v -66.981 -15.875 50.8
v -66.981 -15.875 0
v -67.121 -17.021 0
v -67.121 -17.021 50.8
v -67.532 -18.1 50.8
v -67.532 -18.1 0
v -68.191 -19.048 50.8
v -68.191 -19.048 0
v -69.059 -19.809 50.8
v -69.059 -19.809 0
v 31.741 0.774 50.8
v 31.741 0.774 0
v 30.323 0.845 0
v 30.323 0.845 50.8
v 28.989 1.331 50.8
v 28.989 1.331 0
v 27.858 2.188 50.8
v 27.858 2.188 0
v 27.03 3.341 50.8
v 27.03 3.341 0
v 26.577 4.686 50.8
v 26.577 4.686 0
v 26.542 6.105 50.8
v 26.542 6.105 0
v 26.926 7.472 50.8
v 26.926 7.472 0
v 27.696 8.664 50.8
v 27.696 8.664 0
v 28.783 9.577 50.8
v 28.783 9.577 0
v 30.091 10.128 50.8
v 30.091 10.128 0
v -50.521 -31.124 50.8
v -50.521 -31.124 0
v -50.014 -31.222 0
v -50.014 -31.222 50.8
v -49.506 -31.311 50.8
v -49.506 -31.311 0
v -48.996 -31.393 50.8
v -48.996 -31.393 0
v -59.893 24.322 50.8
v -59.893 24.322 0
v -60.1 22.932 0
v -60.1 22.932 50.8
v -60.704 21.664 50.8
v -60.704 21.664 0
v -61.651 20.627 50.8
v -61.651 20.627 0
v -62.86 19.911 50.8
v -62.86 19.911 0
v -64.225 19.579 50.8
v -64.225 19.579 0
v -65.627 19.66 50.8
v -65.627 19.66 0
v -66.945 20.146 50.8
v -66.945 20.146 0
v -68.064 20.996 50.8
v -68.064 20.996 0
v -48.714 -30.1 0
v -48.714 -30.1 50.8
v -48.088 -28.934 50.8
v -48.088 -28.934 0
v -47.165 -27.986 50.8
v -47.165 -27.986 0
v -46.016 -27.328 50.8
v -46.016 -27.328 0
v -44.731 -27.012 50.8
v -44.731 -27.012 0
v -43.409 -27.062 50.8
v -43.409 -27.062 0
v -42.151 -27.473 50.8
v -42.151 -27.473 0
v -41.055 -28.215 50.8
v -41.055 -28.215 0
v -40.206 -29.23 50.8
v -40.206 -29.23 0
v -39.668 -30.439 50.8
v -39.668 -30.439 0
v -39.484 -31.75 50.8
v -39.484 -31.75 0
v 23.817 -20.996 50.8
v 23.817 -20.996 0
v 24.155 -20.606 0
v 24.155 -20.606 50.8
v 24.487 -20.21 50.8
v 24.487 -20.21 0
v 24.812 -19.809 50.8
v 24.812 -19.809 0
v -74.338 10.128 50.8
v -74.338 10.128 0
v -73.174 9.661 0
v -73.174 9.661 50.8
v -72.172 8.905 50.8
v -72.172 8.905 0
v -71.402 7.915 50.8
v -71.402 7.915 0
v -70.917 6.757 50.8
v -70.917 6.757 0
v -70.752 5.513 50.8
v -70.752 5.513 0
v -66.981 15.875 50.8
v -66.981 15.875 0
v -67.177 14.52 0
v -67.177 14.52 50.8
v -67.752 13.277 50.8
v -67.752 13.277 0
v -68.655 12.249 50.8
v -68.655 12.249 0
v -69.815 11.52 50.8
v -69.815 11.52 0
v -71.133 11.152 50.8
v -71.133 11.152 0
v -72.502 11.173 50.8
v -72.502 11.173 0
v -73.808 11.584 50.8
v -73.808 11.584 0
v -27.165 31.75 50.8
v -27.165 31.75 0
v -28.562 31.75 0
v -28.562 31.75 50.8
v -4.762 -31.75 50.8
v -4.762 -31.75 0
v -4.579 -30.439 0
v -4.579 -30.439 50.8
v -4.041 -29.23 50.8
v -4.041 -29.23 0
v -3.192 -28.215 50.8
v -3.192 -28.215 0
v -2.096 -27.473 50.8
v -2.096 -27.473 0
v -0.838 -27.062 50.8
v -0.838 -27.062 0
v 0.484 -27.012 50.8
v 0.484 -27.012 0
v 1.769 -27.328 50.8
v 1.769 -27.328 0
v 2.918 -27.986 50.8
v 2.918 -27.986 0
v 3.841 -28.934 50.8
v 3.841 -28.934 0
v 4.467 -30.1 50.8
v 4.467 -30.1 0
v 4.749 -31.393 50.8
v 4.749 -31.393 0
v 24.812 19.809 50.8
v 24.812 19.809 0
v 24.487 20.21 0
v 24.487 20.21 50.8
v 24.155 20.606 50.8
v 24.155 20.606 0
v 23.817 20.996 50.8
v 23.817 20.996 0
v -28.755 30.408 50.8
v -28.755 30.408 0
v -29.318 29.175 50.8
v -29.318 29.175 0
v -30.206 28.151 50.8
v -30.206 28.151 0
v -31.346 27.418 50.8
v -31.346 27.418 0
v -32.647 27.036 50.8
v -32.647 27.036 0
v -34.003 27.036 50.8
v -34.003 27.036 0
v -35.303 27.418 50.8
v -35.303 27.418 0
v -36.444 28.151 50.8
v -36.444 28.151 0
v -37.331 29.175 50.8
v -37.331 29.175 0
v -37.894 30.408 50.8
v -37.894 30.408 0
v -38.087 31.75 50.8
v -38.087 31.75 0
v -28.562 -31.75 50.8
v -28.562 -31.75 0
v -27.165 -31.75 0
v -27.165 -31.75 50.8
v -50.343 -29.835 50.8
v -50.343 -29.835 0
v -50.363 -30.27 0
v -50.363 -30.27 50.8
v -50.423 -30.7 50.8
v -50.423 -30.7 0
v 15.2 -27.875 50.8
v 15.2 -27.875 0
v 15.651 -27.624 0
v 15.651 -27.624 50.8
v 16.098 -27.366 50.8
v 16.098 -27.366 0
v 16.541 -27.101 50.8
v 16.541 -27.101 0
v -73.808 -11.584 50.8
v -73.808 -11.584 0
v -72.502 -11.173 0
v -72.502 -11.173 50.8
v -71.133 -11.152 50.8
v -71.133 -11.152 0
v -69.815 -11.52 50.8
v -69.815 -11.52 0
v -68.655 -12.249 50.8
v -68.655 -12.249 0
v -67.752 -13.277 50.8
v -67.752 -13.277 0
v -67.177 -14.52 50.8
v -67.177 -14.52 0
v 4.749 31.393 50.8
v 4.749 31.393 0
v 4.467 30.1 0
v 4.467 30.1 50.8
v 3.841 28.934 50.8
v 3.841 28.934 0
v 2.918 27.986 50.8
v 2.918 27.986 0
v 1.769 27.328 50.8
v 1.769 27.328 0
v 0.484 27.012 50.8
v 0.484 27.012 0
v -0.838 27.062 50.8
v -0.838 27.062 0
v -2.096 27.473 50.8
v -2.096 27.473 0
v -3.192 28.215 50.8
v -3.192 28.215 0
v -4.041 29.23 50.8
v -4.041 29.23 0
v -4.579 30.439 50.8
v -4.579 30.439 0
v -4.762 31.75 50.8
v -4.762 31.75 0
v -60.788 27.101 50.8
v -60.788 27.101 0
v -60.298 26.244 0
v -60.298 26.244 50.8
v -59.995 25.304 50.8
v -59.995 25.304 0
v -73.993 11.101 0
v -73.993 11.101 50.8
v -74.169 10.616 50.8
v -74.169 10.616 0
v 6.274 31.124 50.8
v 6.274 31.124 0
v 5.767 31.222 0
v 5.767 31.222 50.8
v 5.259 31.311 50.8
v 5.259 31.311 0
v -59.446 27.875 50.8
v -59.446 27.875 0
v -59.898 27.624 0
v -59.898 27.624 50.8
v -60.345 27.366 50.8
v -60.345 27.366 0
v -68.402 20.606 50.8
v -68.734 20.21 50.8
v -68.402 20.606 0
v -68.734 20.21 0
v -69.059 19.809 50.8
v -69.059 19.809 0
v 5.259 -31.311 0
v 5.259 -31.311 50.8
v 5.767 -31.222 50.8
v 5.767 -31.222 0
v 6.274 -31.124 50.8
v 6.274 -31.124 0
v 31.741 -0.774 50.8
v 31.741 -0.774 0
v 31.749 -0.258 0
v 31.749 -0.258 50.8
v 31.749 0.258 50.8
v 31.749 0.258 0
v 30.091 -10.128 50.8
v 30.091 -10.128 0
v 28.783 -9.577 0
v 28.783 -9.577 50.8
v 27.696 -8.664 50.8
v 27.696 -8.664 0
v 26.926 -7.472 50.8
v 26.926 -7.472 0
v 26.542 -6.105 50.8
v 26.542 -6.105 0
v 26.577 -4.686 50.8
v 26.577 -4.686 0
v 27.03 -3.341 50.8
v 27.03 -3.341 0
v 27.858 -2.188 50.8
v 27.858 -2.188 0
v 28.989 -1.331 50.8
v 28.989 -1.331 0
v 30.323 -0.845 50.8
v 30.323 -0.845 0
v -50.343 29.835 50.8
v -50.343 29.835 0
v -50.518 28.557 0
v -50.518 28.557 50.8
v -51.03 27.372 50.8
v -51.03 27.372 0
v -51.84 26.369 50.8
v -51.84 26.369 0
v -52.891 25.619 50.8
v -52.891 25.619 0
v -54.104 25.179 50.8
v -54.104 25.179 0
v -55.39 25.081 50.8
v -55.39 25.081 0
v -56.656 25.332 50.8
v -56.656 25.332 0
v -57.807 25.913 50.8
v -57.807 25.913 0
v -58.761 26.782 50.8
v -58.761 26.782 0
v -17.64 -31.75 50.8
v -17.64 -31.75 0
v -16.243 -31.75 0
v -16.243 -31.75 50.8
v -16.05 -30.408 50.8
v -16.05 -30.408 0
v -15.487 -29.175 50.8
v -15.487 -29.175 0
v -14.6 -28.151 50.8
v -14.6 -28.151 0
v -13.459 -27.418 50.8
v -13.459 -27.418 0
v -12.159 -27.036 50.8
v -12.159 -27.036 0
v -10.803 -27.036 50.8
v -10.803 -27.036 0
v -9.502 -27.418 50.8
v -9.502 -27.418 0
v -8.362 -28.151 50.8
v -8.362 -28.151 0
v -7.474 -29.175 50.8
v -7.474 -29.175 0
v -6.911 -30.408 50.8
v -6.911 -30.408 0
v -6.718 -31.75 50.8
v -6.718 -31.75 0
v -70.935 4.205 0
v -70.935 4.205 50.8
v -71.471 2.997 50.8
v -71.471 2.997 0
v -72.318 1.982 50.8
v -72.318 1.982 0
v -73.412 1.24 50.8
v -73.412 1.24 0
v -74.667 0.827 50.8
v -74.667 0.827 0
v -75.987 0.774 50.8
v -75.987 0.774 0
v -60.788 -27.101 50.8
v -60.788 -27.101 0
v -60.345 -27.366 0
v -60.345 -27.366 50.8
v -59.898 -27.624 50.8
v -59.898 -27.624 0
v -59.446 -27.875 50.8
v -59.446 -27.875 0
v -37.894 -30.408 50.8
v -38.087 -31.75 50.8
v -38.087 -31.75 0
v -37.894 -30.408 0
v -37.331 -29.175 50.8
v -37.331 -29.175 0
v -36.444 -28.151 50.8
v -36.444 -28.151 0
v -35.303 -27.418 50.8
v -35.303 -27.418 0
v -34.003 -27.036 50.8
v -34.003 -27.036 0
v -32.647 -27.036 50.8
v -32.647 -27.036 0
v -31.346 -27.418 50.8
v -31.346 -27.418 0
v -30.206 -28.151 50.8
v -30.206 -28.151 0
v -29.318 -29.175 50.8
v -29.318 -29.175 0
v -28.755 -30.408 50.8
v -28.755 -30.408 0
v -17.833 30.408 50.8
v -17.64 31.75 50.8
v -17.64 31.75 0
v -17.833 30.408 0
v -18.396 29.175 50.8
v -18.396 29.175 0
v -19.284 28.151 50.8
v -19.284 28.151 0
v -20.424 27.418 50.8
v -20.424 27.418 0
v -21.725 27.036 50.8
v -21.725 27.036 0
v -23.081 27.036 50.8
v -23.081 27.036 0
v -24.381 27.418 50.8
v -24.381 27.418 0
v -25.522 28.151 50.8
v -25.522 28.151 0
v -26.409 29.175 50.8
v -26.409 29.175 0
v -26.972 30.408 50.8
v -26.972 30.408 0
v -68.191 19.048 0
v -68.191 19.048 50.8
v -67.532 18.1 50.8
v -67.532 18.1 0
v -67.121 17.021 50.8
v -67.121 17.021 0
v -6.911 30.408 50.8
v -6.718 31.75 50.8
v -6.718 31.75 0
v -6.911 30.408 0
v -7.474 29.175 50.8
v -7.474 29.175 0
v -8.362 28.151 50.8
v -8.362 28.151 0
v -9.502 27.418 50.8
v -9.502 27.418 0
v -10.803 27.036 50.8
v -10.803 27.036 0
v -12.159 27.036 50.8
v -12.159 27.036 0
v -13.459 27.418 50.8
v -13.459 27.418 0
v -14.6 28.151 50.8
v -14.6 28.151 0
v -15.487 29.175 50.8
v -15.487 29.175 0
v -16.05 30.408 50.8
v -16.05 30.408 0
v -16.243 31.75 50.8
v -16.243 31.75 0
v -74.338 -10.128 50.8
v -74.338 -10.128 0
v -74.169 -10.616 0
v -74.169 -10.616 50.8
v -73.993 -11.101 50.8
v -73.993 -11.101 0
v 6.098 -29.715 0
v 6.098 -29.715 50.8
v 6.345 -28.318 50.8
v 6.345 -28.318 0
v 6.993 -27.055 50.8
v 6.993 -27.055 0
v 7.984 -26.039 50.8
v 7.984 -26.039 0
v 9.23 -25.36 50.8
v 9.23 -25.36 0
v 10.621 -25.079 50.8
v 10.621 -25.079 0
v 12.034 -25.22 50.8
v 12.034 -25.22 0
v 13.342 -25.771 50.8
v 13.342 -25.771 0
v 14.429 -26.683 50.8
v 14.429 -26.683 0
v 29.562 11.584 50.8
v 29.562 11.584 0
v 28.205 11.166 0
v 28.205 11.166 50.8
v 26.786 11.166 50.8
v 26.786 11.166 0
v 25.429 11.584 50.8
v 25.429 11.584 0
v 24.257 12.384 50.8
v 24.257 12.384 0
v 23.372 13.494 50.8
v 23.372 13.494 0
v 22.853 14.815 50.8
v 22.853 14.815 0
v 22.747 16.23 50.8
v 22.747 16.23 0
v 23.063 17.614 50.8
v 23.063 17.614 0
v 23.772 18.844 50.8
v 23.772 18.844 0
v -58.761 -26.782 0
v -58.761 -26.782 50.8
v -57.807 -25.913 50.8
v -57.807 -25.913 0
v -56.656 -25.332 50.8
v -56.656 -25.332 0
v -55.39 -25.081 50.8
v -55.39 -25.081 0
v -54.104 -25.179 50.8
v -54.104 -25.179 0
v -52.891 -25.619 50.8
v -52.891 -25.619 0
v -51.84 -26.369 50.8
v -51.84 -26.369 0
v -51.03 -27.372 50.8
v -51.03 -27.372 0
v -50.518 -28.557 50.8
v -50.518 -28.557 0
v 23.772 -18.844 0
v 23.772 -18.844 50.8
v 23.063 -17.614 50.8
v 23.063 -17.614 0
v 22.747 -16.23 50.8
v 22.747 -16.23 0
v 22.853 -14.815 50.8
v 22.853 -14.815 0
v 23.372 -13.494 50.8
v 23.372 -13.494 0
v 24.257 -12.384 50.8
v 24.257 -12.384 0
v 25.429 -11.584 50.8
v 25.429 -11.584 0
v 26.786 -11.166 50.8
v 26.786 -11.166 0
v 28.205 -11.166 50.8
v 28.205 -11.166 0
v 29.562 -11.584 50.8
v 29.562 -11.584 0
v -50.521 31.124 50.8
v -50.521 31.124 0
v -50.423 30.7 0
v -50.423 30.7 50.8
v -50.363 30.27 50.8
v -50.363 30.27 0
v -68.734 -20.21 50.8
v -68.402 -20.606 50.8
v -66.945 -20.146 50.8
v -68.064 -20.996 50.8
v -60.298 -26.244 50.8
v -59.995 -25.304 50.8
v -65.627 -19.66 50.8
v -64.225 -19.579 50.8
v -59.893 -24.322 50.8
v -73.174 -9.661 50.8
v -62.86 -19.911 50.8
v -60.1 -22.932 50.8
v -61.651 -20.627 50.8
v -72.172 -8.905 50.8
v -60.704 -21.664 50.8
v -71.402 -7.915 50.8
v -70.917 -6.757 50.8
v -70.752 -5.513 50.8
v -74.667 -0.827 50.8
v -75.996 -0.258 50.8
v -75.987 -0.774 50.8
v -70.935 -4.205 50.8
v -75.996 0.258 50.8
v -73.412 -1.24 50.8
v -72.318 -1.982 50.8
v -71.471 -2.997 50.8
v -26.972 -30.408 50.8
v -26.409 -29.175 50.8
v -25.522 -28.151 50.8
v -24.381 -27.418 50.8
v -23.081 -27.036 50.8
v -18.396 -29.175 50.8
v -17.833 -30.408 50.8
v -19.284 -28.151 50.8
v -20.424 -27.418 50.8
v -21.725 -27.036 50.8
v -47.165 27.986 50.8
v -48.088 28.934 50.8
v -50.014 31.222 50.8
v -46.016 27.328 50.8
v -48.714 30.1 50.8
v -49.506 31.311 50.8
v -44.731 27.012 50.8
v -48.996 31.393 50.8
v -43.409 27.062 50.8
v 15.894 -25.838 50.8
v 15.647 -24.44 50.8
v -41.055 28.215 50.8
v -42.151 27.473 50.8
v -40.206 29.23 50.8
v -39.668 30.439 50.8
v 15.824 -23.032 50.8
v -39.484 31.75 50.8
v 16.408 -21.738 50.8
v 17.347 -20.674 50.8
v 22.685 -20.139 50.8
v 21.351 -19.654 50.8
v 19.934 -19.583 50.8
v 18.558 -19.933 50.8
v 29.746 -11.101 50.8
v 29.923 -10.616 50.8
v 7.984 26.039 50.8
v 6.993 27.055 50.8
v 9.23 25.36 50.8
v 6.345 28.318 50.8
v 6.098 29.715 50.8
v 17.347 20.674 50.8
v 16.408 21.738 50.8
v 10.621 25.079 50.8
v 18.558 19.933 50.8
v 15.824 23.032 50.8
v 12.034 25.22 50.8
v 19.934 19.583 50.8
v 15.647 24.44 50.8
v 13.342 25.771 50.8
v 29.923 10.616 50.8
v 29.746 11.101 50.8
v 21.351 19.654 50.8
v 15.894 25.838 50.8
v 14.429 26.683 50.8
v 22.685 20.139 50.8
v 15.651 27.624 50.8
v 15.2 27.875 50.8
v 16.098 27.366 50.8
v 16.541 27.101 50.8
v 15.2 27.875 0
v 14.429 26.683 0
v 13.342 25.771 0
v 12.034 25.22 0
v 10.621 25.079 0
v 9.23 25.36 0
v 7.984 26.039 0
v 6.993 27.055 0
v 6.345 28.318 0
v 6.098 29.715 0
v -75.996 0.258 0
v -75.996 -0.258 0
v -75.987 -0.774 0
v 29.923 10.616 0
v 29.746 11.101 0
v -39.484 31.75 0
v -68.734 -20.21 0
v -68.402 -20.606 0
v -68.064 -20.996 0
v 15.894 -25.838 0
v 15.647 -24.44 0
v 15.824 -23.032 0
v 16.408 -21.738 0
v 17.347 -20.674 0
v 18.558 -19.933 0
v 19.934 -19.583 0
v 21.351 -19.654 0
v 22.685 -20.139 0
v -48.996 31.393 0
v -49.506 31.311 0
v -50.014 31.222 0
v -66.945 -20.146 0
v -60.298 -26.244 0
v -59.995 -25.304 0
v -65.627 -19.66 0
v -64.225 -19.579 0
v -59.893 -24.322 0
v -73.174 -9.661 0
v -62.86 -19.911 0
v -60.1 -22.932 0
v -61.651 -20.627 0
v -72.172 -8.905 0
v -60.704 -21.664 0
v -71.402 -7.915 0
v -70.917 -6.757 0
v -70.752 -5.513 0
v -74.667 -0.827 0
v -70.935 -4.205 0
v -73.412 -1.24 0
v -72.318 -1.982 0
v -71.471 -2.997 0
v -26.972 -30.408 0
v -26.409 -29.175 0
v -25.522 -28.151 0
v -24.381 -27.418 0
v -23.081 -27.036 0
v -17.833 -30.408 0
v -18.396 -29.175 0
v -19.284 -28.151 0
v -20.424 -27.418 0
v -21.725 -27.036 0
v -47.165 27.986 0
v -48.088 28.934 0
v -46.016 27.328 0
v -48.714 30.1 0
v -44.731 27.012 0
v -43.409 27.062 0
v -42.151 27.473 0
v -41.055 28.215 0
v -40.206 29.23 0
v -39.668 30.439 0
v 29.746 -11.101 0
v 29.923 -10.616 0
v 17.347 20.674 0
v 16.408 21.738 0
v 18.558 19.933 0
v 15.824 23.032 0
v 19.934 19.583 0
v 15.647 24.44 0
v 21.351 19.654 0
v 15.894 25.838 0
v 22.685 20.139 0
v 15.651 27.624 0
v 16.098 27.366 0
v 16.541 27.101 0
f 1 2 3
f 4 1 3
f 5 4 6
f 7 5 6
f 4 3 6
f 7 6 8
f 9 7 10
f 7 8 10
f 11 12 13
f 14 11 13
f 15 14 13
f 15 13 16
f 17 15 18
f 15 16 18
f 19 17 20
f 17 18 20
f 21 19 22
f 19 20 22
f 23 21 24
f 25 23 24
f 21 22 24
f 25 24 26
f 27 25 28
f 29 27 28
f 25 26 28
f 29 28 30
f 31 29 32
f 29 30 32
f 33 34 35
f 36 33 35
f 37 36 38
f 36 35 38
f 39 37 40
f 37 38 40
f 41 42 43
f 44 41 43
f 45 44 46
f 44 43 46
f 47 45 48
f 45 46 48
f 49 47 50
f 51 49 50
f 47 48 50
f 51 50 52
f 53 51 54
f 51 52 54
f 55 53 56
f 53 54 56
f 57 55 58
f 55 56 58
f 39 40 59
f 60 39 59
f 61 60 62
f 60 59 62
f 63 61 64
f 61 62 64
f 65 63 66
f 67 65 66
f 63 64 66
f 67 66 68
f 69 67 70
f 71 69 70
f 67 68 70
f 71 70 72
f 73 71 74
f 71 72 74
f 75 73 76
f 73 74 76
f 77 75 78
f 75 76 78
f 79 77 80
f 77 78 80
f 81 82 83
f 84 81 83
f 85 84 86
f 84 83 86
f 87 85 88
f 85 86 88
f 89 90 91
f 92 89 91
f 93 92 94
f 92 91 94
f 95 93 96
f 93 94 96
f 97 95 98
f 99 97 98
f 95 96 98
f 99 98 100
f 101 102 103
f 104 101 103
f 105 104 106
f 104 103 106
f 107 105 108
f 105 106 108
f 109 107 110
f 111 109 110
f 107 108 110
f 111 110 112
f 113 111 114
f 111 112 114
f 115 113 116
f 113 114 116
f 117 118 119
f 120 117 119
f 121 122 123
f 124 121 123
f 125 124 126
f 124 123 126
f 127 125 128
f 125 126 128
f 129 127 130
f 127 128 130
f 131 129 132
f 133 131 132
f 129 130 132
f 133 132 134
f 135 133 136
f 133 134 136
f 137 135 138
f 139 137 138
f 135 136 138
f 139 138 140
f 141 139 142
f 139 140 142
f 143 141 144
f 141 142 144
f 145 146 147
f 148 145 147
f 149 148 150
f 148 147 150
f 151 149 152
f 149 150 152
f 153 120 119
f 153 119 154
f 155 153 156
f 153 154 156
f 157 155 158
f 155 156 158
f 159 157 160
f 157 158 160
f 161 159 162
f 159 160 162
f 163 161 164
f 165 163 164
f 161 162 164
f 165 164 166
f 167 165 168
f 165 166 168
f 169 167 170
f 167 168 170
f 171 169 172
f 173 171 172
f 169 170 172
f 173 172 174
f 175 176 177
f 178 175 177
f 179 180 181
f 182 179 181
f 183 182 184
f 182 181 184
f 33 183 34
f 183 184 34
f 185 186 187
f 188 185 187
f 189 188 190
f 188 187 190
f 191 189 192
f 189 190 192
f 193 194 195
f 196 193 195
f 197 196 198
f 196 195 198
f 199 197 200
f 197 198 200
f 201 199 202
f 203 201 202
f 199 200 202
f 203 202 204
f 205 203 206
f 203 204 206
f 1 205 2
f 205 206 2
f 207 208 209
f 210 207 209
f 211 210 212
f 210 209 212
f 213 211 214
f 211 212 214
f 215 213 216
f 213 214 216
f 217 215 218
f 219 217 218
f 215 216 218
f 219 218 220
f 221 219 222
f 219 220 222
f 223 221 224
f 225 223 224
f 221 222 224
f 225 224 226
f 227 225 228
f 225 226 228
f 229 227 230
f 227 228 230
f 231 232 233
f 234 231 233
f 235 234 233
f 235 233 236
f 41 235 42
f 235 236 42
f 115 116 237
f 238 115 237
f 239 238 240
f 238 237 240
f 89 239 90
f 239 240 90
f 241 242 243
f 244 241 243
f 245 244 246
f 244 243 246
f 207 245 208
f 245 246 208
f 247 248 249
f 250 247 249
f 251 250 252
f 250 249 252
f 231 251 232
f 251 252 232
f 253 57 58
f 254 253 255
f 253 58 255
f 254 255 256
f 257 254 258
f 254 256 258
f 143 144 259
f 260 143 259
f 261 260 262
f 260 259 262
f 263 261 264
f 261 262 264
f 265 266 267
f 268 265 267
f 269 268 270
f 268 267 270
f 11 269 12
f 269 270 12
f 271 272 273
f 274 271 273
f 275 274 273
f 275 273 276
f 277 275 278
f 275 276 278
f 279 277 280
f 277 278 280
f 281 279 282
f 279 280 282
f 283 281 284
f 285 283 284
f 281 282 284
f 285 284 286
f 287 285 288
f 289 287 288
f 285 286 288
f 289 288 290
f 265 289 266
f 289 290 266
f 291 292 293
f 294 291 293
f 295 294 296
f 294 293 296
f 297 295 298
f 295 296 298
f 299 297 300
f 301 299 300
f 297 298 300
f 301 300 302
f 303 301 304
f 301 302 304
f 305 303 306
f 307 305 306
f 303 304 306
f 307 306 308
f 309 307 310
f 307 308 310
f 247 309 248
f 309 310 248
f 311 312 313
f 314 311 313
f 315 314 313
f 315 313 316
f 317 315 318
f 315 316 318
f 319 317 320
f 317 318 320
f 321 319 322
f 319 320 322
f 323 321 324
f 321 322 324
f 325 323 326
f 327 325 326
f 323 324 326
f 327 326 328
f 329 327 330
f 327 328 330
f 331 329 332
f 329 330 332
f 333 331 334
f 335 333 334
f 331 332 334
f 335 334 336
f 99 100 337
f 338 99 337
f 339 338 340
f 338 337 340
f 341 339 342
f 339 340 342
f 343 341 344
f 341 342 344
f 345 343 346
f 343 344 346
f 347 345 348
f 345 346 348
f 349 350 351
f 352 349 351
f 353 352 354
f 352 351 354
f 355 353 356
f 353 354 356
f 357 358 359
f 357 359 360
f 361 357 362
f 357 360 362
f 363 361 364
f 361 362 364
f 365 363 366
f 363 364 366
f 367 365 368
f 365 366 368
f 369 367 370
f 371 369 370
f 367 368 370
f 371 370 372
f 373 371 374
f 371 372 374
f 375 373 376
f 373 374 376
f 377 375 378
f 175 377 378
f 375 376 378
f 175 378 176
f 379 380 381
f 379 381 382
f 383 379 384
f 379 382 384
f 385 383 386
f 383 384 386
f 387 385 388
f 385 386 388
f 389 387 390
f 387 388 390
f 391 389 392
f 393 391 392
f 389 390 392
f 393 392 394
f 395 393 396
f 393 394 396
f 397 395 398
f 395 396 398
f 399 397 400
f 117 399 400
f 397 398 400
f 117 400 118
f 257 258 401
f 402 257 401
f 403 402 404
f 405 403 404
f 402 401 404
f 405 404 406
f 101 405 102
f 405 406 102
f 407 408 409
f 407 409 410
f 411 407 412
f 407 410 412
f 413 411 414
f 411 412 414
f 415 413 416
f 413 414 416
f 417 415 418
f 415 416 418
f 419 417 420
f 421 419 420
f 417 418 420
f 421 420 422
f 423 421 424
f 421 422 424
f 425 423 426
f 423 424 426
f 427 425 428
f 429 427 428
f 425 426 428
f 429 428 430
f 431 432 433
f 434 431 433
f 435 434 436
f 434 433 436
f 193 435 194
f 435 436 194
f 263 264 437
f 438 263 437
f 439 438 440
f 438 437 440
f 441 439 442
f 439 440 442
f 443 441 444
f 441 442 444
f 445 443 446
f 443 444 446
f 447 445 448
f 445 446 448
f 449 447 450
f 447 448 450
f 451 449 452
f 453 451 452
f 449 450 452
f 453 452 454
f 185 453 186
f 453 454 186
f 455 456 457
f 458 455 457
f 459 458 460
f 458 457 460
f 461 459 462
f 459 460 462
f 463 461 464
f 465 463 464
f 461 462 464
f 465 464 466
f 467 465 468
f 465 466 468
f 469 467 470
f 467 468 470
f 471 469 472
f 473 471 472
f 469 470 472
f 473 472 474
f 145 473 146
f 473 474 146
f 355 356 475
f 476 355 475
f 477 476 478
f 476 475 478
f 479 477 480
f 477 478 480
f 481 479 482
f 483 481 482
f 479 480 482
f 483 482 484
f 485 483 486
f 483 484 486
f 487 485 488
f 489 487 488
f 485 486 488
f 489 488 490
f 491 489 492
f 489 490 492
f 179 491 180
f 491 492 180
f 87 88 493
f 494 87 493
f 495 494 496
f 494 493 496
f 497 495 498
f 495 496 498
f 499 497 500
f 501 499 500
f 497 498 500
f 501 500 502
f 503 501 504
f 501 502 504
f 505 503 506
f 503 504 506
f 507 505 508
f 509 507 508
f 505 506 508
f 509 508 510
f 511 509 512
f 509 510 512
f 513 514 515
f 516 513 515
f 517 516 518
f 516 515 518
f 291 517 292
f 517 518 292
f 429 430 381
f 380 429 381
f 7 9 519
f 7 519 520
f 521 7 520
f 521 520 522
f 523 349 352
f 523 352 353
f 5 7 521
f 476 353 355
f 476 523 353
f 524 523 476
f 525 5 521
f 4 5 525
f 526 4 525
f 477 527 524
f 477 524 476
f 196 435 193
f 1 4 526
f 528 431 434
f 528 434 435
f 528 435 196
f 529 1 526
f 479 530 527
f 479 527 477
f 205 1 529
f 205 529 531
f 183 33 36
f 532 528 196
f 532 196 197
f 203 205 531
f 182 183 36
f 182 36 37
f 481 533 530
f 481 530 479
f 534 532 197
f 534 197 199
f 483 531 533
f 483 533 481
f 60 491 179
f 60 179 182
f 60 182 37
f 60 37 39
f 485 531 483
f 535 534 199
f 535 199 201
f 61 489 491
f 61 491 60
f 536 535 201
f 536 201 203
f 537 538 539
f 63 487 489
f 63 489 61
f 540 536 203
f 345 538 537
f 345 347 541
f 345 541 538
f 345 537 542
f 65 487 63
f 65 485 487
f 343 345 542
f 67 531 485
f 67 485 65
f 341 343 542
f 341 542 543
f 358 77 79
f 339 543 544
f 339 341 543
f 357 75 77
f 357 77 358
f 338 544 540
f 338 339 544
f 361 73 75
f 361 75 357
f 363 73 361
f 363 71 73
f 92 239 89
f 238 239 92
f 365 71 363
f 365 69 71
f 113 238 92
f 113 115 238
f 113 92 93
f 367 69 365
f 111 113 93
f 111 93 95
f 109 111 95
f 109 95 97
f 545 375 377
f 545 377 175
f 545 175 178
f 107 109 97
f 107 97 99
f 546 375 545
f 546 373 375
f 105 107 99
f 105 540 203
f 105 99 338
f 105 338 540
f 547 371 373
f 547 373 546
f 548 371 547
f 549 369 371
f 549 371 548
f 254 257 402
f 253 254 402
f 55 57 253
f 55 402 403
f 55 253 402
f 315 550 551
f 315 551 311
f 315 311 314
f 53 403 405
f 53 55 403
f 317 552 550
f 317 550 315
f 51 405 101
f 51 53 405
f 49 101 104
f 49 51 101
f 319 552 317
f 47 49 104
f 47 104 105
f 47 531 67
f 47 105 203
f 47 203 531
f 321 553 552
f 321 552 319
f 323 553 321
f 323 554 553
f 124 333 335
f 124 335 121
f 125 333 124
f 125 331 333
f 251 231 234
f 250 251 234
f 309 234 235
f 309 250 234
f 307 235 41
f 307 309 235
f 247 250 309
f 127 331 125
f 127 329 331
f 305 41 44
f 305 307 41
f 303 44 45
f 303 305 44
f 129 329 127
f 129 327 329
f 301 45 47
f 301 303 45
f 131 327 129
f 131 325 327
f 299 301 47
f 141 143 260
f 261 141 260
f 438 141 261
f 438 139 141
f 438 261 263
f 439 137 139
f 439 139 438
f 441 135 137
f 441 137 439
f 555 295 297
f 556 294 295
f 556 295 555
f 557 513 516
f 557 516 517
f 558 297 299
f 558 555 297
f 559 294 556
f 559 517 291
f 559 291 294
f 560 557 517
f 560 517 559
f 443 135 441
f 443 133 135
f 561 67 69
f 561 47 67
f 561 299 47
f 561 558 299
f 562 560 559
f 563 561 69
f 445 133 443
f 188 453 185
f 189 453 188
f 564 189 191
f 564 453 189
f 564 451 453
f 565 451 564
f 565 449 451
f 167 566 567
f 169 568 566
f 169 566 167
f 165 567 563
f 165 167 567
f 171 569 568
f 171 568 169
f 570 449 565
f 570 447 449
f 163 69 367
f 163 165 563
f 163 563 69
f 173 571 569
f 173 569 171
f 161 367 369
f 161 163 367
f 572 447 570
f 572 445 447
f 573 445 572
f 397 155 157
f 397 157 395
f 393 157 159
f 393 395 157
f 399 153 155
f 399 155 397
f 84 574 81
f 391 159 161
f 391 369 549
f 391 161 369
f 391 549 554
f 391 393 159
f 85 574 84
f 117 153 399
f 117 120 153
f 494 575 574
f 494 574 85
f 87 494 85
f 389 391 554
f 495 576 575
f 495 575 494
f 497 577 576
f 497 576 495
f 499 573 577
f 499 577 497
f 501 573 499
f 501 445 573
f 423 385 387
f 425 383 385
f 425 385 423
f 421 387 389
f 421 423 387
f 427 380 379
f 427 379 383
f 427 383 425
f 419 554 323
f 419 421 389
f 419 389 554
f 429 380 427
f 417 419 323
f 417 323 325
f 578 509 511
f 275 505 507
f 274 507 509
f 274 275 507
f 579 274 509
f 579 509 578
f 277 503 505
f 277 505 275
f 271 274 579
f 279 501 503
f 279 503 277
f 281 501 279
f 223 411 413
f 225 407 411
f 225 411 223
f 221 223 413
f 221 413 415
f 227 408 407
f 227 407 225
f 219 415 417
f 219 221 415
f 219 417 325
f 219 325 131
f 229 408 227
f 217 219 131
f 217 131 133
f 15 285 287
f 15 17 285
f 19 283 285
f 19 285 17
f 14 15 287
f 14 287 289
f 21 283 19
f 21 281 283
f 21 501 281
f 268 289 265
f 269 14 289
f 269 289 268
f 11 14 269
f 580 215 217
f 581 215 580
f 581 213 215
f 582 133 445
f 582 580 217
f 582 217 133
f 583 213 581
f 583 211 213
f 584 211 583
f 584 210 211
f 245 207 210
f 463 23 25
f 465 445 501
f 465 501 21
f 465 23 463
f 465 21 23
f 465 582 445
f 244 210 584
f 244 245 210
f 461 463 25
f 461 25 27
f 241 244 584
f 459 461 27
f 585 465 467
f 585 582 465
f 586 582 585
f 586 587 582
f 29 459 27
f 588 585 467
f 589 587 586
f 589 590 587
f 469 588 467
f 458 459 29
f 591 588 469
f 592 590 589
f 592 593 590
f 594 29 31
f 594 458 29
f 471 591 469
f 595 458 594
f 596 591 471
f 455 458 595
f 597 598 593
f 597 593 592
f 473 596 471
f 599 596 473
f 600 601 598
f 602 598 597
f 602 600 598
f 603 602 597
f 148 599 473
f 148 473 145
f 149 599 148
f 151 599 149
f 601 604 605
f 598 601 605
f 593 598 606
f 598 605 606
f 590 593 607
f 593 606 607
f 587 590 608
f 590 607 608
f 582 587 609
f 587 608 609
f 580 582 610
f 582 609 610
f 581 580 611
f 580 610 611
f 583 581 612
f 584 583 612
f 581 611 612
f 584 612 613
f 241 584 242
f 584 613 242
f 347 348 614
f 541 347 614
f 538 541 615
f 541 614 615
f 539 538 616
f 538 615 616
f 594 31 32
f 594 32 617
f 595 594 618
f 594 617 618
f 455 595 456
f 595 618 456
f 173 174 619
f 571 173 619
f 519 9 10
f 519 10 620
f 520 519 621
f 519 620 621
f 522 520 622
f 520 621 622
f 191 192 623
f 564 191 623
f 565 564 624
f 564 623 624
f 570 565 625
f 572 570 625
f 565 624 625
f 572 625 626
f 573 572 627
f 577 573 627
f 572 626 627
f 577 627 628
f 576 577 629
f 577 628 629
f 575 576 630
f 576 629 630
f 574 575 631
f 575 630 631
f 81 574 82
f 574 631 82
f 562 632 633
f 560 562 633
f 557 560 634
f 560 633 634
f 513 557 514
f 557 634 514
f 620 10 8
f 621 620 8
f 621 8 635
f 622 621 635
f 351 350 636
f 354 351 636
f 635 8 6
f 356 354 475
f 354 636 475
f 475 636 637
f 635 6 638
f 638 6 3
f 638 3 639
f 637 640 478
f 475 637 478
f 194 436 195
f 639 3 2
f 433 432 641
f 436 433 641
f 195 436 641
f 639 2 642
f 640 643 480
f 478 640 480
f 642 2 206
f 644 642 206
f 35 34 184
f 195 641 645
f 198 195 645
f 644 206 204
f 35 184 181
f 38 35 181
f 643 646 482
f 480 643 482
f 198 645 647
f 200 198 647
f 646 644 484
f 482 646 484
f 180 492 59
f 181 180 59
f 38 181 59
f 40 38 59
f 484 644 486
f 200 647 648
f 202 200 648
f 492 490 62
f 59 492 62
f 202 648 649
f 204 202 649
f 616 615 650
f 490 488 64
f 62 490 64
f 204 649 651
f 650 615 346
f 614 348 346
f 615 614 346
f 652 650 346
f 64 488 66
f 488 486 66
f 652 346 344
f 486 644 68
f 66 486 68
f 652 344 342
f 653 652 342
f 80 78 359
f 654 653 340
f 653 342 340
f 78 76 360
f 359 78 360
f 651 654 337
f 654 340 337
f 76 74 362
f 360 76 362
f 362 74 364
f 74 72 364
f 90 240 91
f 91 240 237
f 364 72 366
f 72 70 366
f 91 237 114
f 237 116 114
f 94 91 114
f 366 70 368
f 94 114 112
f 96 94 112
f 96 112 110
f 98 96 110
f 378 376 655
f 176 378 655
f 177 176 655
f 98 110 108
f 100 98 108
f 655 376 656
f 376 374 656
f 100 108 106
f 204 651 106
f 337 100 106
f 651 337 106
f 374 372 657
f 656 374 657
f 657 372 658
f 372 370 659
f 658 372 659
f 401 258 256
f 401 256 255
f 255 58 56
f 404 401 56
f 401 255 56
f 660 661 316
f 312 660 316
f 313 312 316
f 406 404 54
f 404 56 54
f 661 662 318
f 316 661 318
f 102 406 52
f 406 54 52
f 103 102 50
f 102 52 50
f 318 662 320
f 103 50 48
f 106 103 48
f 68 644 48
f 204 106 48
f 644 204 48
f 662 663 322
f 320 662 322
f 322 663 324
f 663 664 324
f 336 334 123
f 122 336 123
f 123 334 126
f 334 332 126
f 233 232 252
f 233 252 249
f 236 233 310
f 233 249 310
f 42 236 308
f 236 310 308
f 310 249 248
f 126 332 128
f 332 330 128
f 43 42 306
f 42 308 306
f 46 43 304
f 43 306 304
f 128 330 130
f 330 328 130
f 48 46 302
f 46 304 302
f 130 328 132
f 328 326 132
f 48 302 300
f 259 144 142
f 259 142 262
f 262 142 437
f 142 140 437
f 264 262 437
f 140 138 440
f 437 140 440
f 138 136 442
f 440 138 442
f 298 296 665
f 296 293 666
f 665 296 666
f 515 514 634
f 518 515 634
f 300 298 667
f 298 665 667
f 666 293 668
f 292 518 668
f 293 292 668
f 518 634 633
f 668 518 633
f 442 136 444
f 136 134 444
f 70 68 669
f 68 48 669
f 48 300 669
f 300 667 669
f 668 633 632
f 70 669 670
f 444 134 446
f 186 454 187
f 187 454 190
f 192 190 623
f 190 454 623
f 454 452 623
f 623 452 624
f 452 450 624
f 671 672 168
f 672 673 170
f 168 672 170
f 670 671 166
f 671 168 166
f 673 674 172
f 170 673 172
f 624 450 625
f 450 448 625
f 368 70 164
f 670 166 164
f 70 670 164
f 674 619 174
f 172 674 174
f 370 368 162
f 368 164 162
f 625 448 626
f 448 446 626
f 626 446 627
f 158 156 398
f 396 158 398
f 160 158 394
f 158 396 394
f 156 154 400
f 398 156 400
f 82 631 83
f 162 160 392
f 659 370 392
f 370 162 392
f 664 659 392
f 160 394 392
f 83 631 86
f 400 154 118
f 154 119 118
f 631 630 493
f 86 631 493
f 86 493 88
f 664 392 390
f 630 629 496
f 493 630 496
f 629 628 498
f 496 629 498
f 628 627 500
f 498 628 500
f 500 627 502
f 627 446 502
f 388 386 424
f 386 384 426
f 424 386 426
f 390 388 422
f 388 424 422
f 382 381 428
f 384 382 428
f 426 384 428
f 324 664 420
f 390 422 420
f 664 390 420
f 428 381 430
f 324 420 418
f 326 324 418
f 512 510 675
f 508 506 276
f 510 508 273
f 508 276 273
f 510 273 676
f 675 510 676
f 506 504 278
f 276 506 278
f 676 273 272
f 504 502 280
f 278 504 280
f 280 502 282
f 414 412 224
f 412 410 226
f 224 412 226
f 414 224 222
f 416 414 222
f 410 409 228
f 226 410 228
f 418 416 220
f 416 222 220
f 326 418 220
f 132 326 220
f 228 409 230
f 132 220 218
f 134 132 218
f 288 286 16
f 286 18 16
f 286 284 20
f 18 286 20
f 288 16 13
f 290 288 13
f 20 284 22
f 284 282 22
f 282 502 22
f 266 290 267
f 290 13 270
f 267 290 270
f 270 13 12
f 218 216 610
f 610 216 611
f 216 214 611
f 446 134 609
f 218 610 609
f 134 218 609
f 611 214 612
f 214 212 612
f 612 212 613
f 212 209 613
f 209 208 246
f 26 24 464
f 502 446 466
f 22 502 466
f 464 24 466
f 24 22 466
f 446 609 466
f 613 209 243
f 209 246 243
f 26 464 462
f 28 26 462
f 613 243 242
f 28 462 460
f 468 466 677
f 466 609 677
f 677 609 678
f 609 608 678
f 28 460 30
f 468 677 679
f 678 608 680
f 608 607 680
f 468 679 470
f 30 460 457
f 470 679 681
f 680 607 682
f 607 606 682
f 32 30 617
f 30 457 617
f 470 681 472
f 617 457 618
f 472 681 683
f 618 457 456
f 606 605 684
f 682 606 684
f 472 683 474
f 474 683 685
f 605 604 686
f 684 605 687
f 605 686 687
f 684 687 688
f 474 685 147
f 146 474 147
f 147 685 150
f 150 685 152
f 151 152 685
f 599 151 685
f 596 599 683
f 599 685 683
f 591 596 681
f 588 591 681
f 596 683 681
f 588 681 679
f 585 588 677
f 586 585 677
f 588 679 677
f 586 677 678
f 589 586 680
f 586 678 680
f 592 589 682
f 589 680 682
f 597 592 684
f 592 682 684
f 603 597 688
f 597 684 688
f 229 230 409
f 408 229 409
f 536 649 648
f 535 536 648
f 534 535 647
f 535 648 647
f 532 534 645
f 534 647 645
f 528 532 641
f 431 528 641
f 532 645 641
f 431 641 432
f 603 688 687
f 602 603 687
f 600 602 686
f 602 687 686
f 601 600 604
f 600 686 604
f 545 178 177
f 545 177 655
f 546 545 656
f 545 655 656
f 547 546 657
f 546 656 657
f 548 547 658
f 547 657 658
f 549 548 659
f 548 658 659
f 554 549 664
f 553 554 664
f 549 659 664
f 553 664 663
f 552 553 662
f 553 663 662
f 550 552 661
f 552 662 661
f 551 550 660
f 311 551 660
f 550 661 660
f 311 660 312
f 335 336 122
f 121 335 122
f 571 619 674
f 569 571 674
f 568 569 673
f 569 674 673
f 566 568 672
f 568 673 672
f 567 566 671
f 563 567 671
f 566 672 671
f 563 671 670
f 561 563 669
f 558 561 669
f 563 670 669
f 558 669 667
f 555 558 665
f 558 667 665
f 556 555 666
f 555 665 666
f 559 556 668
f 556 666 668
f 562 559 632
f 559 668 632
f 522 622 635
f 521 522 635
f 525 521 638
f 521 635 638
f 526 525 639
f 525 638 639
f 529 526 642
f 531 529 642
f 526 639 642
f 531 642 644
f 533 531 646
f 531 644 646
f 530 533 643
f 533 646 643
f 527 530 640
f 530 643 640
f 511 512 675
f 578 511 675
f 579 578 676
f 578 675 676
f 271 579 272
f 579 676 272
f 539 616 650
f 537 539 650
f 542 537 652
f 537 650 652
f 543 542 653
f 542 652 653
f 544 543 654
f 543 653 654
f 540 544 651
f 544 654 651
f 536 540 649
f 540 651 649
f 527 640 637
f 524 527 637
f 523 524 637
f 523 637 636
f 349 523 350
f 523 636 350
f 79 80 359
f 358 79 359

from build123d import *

# Parameters (mm, degrees)
F1_DEPTH = 50.8


with BuildPart() as f1:
    # F0 (on Top) → F1 (new body)
    with BuildSketch(Plane.XY):
        with BuildLine():
            ThreePointArc((-39.4843, 31.75), (-44.0680803662, 26.9908545365), (-48.9958865795, 31.3928125))
            ThreePointArc((-48.9958865795, 31.3928125), (-49.7601296409, 31.2676461581), (-50.5210926164, 31.1238775246))
            ThreePointArc((-50.5210926164, 31.1238775246), (-50.3880618617, 30.485653166), (-50.3434395506, 29.83524071))
            ThreePointArc((-50.3434395506, 29.83524071), (-54.1035181326, 25.1794316985), (-59.4464558449, 27.8753109794))
            ThreePointArc((-59.4464558449, 27.8753109794), (-60.1218, 27.4963065702), (-60.7876995241, 27.1009435801))
            ThreePointArc((-60.7876995241, 27.1009435801), (-60.1220470195, 25.7816931615), (-59.8928066075, 24.321911069))
            ThreePointArc((-59.8928066075, 24.321911069), (-62.859641473, 19.9109029105), (-68.0637222924, 20.9956355589))
            ThreePointArc((-68.0637222924, 20.9956355589), (-68.568711069, 20.4085066075), (-69.0592298315, 19.8092358726))
            ThreePointArc((-69.0592298315, 19.8092358726), (-67.5322058816, 18.0997969887), (-66.9806065702, 15.875))
            ThreePointArc((-66.9806065702, 15.875), (-69.2087580954, 11.8428189452), (-73.808316411, 11.5835766274))
            ThreePointArc((-73.808316411, 11.5835766274), (-74.08204071, 10.8591395506), (-74.3380149087, 10.1282419657))
            ThreePointArc((-74.3380149087, 10.1282419657), (-71.7538504556, 8.4355421952), (-70.7519461581, 5.5133296409))
            ThreePointArc((-70.7519461581, 5.5133296409), (-72.3184192392, 1.9824914708), (-75.987355369, 0.7743673992))
            ThreePointArc((-75.987355369, 0.7743673992), (-75.9968, 0), (-75.987355369, -0.7743673992))
            ThreePointArc((-75.987355369, -0.7743673992), (-72.3184192392, -1.9824914708), (-70.7519461581, -5.5133296409))
            ThreePointArc((-70.7519461581, -5.5133296409), (-71.7538504556, -8.4355421952), (-74.3380149087, -10.1282419657))
            ThreePointArc((-74.3380149087, -10.1282419657), (-74.08204071, -10.8591395506), (-73.808316411, -11.5835766274))
            ThreePointArc((-73.808316411, -11.5835766274), (-69.2087580954, -11.8428189452), (-66.9806065702, -15.875))
            ThreePointArc((-66.9806065702, -15.875), (-67.5322058816, -18.0997969887), (-69.0592298315, -19.8092358726))
            ThreePointArc((-69.0592298315, -19.8092358726), (-68.568711069, -20.4085066075), (-68.0637222924, -20.9956355589))
            ThreePointArc((-68.0637222924, -20.9956355589), (-62.859641473, -19.9109029105), (-59.8928066075, -24.321911069))
            ThreePointArc((-59.8928066075, -24.321911069), (-60.1220470195, -25.7816931615), (-60.7876995241, -27.1009435801))
            ThreePointArc((-60.7876995241, -27.1009435801), (-60.1218, -27.4963065702), (-59.4464558449, -27.8753109794))
            ThreePointArc((-59.4464558449, -27.8753109794), (-54.1035181326, -25.1794316985), (-50.3434395506, -29.83524071))
            ThreePointArc((-50.3434395506, -29.83524071), (-50.3880618617, -30.485653166), (-50.5210926164, -31.1238775246))
            ThreePointArc((-50.5210926164, -31.1238775246), (-49.7601296409, -31.2676461581), (-48.9958865795, -31.3928125))
            ThreePointArc((-48.9958865795, -31.3928125), (-44.0680803662, -26.9908545365), (-39.4843, -31.75))
            Line((-39.4843, -31.75), (-38.0873, -31.75))
            ThreePointArc((-38.0873, -31.75), (-33.3248, -26.9875), (-28.5623, -31.75))
            Line((-28.5623, -31.75), (-27.1653, -31.75))
            ThreePointArc((-27.1653, -31.75), (-22.4028, -26.9875), (-17.6403, -31.75))
            Line((-17.6403, -31.75), (-16.2433, -31.75))
            ThreePointArc((-16.2433, -31.75), (-11.4808, -26.9875), (-6.7183, -31.75))
            Line((-6.7183, -31.75), (-4.7625, -31.75))
            ThreePointArc((-4.7625, -31.75), (-0.1787196338, -26.9908545365), (4.7490865795, -31.3928125))
            ThreePointArc((4.7490865795, -31.3928125), (5.5133296409, -31.2676461581), (6.2742926164, -31.1238775246))
            ThreePointArc((6.2742926164, -31.1238775246), (9.230268618, -25.3599546035), (15.1996558449, -27.8753109794))
            ThreePointArc((15.1996558449, -27.8753109794), (15.875, -27.4963065702), (16.5408995241, -27.1009435801))
            ThreePointArc((16.5408995241, -27.1009435801), (17.3472306164, -20.6736244087), (23.8169222924, -20.9956355589))
            ThreePointArc((23.8169222924, -20.9956355589), (24.321911069, -20.4085066075), (24.8124298315, -19.8092358726))
            ThreePointArc((24.8124298315, -19.8092358726), (23.3718605846, -13.49375), (29.561516411, -11.5835766274))
            ThreePointArc((29.561516411, -11.5835766274), (29.83524071, -10.8591395506), (30.0912149087, -10.1282419657))
            ThreePointArc((30.0912149087, -10.1282419657), (26.5774992344, -4.6863301948), (31.740555369, -0.7743673992))
            ThreePointArc((31.740555369, -0.7743673992), (31.75, 0), (31.740555369, 0.7743673992))
            ThreePointArc((31.740555369, 0.7743673992), (26.5774992344, 4.6863301948), (30.0912149087, 10.1282419657))
            ThreePointArc((30.0912149087, 10.1282419657), (29.83524071, 10.8591395506), (29.561516411, 11.5835766274))
            ThreePointArc((29.561516411, 11.5835766274), (23.3718605846, 13.49375), (24.8124298315, 19.8092358726))
            ThreePointArc((24.8124298315, 19.8092358726), (24.321911069, 20.4085066075), (23.8169222924, 20.9956355589))
            ThreePointArc((23.8169222924, 20.9956355589), (17.3472306164, 20.6736244087), (16.5408995241, 27.1009435801))
            ThreePointArc((16.5408995241, 27.1009435801), (15.875, 27.4963065702), (15.1996558449, 27.8753109794))
            ThreePointArc((15.1996558449, 27.8753109794), (9.230268618, 25.3599546035), (6.2742926164, 31.1238775246))
            ThreePointArc((6.2742926164, 31.1238775246), (5.5133296409, 31.2676461581), (4.7490865795, 31.3928125))
            ThreePointArc((4.7490865795, 31.3928125), (-0.1787196338, 26.9908545365), (-4.7625, 31.75))
            Line((-4.7625, 31.75), (-6.7183, 31.75))
            ThreePointArc((-6.7183, 31.75), (-11.4808, 26.9875), (-16.2433, 31.75))
            Line((-16.2433, 31.75), (-17.6403, 31.75))
            ThreePointArc((-17.6403, 31.75), (-22.4028, 26.9875), (-27.1653, 31.75))
            Line((-27.1653, 31.75), (-28.5623, 31.75))
            ThreePointArc((-28.5623, 31.75), (-33.3248, 26.9875), (-38.0873, 31.75))
            Line((-38.0873, 31.75), (-39.4843, 31.75))
        make_face()
    extrude(amount=F1_DEPTH)


solid = f1.part
